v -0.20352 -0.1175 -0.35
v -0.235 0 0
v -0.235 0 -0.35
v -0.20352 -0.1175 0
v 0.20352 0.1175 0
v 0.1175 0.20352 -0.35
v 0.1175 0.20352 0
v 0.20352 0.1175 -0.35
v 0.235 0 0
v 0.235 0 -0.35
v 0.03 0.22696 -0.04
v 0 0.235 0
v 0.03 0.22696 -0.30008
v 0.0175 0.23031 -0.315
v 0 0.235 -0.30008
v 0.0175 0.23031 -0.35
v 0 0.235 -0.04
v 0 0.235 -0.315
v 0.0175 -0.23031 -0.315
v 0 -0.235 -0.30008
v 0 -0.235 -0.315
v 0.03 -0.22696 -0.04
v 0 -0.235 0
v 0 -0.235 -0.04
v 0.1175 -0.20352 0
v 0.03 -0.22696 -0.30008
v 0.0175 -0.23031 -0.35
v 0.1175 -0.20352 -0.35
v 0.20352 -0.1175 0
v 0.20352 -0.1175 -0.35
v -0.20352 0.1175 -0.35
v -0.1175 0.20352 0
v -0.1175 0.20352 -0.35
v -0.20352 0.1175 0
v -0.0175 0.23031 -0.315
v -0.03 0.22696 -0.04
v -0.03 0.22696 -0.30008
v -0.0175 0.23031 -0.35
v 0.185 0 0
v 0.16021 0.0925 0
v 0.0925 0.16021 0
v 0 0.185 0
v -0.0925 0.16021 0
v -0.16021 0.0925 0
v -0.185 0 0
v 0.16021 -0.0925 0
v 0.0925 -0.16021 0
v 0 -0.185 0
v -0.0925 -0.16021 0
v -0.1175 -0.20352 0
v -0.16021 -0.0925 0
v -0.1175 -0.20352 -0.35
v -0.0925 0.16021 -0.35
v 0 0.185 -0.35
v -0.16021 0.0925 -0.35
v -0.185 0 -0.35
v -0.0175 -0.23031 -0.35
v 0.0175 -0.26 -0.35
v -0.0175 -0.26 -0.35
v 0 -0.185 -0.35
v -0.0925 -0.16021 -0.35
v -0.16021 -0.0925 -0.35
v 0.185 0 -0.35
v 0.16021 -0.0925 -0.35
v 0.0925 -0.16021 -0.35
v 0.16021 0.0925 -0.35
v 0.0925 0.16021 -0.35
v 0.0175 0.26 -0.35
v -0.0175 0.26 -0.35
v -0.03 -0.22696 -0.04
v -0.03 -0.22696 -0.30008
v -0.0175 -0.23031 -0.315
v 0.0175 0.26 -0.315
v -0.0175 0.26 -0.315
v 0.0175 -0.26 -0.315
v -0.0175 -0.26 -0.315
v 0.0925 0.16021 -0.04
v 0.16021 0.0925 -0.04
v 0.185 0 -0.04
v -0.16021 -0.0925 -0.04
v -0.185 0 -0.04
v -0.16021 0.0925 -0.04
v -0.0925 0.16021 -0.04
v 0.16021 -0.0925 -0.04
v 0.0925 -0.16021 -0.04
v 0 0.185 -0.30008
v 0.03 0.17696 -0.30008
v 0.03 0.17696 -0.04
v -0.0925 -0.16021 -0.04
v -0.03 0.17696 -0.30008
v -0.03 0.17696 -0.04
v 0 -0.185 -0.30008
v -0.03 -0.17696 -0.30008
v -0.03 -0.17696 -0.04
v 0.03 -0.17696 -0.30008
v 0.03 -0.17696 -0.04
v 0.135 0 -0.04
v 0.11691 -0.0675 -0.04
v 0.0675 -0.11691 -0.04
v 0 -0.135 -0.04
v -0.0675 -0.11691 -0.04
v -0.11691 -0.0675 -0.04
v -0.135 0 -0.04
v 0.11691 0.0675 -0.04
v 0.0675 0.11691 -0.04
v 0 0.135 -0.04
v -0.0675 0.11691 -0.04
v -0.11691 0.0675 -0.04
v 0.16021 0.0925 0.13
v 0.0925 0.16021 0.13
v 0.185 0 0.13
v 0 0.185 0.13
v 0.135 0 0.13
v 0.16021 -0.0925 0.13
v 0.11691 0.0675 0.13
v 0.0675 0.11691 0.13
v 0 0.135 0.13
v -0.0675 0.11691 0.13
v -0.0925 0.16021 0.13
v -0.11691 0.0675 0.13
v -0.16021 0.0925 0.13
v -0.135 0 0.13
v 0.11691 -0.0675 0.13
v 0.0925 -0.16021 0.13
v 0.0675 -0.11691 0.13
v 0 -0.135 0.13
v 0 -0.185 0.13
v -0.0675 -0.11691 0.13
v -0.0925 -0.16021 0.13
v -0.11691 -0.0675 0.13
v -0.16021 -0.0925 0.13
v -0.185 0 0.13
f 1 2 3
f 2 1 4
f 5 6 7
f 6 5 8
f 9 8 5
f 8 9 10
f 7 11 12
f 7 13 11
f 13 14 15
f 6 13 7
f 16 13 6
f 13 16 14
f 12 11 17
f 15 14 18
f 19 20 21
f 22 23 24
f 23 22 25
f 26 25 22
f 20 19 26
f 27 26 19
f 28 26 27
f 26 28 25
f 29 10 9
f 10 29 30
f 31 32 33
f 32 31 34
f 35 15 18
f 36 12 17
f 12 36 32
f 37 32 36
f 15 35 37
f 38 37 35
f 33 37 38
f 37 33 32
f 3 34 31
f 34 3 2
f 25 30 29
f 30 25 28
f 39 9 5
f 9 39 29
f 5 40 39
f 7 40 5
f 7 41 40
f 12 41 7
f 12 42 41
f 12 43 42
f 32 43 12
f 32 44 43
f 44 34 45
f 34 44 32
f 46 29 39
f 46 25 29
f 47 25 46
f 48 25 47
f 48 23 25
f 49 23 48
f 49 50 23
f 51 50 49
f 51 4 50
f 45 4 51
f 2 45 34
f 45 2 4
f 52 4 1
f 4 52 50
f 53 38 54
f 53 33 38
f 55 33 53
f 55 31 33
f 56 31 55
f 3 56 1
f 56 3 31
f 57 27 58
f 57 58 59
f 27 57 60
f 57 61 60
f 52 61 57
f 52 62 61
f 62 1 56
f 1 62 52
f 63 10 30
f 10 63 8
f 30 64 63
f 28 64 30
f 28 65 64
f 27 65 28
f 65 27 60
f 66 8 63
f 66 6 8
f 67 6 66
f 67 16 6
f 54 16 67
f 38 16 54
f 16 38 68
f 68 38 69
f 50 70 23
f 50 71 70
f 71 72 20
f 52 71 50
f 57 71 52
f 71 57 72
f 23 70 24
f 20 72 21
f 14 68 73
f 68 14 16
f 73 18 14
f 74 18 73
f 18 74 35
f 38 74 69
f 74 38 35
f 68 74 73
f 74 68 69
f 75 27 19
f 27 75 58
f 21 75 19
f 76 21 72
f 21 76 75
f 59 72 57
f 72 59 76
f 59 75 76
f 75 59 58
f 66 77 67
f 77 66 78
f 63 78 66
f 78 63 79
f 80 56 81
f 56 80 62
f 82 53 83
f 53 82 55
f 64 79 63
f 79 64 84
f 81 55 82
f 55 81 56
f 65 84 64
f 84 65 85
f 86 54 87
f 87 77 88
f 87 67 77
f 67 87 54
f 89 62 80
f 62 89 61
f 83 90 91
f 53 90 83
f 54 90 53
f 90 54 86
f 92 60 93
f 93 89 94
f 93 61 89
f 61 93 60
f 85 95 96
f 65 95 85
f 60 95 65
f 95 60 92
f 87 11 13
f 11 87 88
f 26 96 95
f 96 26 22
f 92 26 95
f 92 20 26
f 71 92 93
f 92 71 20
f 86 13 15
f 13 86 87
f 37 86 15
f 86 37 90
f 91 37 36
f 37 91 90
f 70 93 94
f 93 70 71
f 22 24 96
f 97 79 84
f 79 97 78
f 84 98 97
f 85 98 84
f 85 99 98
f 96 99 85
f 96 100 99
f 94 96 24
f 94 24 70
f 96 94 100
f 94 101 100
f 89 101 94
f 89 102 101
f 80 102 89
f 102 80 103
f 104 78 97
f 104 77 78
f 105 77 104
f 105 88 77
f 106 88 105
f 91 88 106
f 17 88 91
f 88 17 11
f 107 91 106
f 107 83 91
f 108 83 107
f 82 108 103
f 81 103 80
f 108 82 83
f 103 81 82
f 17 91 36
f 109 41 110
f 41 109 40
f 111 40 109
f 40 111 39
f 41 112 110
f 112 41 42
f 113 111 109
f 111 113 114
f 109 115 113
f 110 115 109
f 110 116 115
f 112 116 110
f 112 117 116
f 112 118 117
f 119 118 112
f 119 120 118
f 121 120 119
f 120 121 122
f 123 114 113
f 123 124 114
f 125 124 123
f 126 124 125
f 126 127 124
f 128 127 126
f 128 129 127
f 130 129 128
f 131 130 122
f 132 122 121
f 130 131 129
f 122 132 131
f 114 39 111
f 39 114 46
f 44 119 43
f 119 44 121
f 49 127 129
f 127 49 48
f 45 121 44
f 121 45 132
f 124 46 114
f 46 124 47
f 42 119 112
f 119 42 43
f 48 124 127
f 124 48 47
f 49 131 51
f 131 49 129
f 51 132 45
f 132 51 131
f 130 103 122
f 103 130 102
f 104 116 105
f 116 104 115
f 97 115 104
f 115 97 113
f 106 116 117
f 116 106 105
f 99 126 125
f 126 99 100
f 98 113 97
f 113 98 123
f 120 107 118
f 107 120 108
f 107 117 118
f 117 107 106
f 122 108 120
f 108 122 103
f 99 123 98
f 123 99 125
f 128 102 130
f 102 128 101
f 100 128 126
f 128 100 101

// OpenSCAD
tolerance = 0.015;
hole_radius = 0.045;
grid_hole_radius = 0.03;
outer_radius = 0.3;
thickness = 0.05;
hole_attach_height = 0.02;
compressed_height = 0.7;
extended_height = 1;
next_hole_radius = 0.045;
next_hole_attach_height = 0.02;
next_inner = 0.2;
hole_twist = 0;

//other params
eps = tolerance/100;
rail_attach_height = grid_hole_radius + hole_attach_height;
inner_radius = outer_radius - thickness;
rail_attach_width = rail_attach_height;
fn = 12;
fnh = 6;

module angled_cylinder(angle_deg_y, _h, _r, angle_deg_x = 0) {
    rotate([angle_deg_x, angle_deg_y, 0]) { // Rotate the cylinder 
            cylinder(h = _h, r = _r, center = true, $fn = fnh);
        }
}

module top_joint() {
    total_height = extended_height - compressed_height + rail_attach_height;
    difference() {
        union() {
            //outer cylinder
            cylinder(h=extended_height - compressed_height + rail_attach_height, r = inner_radius - tolerance, $fn = fn);
            
            //rail attachments
            translate([-(rail_attach_width - tolerance)/2,inner_radius - tolerance - thickness/2, 0])
            cube([rail_attach_width - tolerance, thickness, rail_attach_height - tolerance]);
            
            translate([-(rail_attach_width - tolerance)/2,-inner_radius + tolerance - thickness/2, 0])
            cube([rail_attach_width - tolerance, thickness, rail_attach_height - tolerance]);
            
        }
        //shell out inner cylinder
        translate([0,0,-eps/2])
        cylinder(h=extended_height - compressed_height + rail_attach_height + eps, r= inner_radius - tolerance - thickness, $fn = fn);
        
        translate([0,0,rail_attach_height + (extended_height - compressed_height)/2])
        cube([grid_hole_radius*2, inner_radius*2 + eps, extended_height - compressed_height + eps],center=true);
    }
    
    //to tie strings
//    difference() {
//        union() {
//            //loop for strings
//            translate([0, inner_radius - tolerance - grid_hole_radius - hole_attach_height,0])
//            cylinder(h=rail_attach_height - tolerance,r=grid_hole_radius + hole_attach_height,$fn=fnh);
//            
//            translate([0, -inner_radius + tolerance + grid_hole_radius + hole_attach_height,0])
//            cylinder(h=rail_attach_height - tolerance,r=grid_hole_radius + hole_attach_height,$fn=fnh);
//        }
//        
//        translate([0,0,-eps/2]) {
//            //hole for string loops
//        translate([0, inner_radius - tolerance - grid_hole_radius - hole_attach_height,0])
//            cylinder(h=rail_attach_height-tolerance + eps,r=grid_hole_radius,$fn=fnh);
//            
//        translate([0, -inner_radius + tolerance + grid_hole_radius + hole_attach_height,0])
//        cylinder(h=rail_attach_height - tolerance + eps,r=grid_hole_radius,$fn=fnh);
//        }
//    }
    
    
    //attachment segment
    attach_thickness = hole_attach_height;
    difference() {
        union() {
            //attachment for smaller cylinder
            translate([0,0,-attach_thickness*2 + total_height])
            cylinder(h=attach_thickness*2, r=inner_radius - tolerance, $fn=fn);
            translate([0,0,-attach_thickness*2 + total_height])
            cylinder(h=attach_thickness*2, r1=inner_radius - tolerance, r2=next_inner - tolerance - thickness, $fn=fn);
            
            translate([0,0,total_height])
            //small cylinder
            cylinder(h=next_hole_radius*2 + next_hole_attach_height * 2, r = next_inner - tolerance, $fn=fn);
        }
        
        //shelling
        translate([0,0, -attach_thickness*2 - eps/2 + total_height])
        cylinder(h=next_hole_radius*2 + next_hole_attach_height * 2 + attach_thickness*2 + eps, r = min(inner_radius, next_inner - tolerance - thickness), $fn=fn);
        
        //holes for screws
//        translate([0,0,next_hole_attach_height + next_hole_radius + total_height]) {
//            angled_cylinder(0, (next_inner + thickness + eps) * 2,  next_hole_radius, 90);
//            angled_cylinder(90, (next_inner + thickness + eps) * 2, next_hole_radius, 0);
//        }
    }
 
}

translate([0,0,-extended_height+compressed_height-rail_attach_height])
top_joint();
